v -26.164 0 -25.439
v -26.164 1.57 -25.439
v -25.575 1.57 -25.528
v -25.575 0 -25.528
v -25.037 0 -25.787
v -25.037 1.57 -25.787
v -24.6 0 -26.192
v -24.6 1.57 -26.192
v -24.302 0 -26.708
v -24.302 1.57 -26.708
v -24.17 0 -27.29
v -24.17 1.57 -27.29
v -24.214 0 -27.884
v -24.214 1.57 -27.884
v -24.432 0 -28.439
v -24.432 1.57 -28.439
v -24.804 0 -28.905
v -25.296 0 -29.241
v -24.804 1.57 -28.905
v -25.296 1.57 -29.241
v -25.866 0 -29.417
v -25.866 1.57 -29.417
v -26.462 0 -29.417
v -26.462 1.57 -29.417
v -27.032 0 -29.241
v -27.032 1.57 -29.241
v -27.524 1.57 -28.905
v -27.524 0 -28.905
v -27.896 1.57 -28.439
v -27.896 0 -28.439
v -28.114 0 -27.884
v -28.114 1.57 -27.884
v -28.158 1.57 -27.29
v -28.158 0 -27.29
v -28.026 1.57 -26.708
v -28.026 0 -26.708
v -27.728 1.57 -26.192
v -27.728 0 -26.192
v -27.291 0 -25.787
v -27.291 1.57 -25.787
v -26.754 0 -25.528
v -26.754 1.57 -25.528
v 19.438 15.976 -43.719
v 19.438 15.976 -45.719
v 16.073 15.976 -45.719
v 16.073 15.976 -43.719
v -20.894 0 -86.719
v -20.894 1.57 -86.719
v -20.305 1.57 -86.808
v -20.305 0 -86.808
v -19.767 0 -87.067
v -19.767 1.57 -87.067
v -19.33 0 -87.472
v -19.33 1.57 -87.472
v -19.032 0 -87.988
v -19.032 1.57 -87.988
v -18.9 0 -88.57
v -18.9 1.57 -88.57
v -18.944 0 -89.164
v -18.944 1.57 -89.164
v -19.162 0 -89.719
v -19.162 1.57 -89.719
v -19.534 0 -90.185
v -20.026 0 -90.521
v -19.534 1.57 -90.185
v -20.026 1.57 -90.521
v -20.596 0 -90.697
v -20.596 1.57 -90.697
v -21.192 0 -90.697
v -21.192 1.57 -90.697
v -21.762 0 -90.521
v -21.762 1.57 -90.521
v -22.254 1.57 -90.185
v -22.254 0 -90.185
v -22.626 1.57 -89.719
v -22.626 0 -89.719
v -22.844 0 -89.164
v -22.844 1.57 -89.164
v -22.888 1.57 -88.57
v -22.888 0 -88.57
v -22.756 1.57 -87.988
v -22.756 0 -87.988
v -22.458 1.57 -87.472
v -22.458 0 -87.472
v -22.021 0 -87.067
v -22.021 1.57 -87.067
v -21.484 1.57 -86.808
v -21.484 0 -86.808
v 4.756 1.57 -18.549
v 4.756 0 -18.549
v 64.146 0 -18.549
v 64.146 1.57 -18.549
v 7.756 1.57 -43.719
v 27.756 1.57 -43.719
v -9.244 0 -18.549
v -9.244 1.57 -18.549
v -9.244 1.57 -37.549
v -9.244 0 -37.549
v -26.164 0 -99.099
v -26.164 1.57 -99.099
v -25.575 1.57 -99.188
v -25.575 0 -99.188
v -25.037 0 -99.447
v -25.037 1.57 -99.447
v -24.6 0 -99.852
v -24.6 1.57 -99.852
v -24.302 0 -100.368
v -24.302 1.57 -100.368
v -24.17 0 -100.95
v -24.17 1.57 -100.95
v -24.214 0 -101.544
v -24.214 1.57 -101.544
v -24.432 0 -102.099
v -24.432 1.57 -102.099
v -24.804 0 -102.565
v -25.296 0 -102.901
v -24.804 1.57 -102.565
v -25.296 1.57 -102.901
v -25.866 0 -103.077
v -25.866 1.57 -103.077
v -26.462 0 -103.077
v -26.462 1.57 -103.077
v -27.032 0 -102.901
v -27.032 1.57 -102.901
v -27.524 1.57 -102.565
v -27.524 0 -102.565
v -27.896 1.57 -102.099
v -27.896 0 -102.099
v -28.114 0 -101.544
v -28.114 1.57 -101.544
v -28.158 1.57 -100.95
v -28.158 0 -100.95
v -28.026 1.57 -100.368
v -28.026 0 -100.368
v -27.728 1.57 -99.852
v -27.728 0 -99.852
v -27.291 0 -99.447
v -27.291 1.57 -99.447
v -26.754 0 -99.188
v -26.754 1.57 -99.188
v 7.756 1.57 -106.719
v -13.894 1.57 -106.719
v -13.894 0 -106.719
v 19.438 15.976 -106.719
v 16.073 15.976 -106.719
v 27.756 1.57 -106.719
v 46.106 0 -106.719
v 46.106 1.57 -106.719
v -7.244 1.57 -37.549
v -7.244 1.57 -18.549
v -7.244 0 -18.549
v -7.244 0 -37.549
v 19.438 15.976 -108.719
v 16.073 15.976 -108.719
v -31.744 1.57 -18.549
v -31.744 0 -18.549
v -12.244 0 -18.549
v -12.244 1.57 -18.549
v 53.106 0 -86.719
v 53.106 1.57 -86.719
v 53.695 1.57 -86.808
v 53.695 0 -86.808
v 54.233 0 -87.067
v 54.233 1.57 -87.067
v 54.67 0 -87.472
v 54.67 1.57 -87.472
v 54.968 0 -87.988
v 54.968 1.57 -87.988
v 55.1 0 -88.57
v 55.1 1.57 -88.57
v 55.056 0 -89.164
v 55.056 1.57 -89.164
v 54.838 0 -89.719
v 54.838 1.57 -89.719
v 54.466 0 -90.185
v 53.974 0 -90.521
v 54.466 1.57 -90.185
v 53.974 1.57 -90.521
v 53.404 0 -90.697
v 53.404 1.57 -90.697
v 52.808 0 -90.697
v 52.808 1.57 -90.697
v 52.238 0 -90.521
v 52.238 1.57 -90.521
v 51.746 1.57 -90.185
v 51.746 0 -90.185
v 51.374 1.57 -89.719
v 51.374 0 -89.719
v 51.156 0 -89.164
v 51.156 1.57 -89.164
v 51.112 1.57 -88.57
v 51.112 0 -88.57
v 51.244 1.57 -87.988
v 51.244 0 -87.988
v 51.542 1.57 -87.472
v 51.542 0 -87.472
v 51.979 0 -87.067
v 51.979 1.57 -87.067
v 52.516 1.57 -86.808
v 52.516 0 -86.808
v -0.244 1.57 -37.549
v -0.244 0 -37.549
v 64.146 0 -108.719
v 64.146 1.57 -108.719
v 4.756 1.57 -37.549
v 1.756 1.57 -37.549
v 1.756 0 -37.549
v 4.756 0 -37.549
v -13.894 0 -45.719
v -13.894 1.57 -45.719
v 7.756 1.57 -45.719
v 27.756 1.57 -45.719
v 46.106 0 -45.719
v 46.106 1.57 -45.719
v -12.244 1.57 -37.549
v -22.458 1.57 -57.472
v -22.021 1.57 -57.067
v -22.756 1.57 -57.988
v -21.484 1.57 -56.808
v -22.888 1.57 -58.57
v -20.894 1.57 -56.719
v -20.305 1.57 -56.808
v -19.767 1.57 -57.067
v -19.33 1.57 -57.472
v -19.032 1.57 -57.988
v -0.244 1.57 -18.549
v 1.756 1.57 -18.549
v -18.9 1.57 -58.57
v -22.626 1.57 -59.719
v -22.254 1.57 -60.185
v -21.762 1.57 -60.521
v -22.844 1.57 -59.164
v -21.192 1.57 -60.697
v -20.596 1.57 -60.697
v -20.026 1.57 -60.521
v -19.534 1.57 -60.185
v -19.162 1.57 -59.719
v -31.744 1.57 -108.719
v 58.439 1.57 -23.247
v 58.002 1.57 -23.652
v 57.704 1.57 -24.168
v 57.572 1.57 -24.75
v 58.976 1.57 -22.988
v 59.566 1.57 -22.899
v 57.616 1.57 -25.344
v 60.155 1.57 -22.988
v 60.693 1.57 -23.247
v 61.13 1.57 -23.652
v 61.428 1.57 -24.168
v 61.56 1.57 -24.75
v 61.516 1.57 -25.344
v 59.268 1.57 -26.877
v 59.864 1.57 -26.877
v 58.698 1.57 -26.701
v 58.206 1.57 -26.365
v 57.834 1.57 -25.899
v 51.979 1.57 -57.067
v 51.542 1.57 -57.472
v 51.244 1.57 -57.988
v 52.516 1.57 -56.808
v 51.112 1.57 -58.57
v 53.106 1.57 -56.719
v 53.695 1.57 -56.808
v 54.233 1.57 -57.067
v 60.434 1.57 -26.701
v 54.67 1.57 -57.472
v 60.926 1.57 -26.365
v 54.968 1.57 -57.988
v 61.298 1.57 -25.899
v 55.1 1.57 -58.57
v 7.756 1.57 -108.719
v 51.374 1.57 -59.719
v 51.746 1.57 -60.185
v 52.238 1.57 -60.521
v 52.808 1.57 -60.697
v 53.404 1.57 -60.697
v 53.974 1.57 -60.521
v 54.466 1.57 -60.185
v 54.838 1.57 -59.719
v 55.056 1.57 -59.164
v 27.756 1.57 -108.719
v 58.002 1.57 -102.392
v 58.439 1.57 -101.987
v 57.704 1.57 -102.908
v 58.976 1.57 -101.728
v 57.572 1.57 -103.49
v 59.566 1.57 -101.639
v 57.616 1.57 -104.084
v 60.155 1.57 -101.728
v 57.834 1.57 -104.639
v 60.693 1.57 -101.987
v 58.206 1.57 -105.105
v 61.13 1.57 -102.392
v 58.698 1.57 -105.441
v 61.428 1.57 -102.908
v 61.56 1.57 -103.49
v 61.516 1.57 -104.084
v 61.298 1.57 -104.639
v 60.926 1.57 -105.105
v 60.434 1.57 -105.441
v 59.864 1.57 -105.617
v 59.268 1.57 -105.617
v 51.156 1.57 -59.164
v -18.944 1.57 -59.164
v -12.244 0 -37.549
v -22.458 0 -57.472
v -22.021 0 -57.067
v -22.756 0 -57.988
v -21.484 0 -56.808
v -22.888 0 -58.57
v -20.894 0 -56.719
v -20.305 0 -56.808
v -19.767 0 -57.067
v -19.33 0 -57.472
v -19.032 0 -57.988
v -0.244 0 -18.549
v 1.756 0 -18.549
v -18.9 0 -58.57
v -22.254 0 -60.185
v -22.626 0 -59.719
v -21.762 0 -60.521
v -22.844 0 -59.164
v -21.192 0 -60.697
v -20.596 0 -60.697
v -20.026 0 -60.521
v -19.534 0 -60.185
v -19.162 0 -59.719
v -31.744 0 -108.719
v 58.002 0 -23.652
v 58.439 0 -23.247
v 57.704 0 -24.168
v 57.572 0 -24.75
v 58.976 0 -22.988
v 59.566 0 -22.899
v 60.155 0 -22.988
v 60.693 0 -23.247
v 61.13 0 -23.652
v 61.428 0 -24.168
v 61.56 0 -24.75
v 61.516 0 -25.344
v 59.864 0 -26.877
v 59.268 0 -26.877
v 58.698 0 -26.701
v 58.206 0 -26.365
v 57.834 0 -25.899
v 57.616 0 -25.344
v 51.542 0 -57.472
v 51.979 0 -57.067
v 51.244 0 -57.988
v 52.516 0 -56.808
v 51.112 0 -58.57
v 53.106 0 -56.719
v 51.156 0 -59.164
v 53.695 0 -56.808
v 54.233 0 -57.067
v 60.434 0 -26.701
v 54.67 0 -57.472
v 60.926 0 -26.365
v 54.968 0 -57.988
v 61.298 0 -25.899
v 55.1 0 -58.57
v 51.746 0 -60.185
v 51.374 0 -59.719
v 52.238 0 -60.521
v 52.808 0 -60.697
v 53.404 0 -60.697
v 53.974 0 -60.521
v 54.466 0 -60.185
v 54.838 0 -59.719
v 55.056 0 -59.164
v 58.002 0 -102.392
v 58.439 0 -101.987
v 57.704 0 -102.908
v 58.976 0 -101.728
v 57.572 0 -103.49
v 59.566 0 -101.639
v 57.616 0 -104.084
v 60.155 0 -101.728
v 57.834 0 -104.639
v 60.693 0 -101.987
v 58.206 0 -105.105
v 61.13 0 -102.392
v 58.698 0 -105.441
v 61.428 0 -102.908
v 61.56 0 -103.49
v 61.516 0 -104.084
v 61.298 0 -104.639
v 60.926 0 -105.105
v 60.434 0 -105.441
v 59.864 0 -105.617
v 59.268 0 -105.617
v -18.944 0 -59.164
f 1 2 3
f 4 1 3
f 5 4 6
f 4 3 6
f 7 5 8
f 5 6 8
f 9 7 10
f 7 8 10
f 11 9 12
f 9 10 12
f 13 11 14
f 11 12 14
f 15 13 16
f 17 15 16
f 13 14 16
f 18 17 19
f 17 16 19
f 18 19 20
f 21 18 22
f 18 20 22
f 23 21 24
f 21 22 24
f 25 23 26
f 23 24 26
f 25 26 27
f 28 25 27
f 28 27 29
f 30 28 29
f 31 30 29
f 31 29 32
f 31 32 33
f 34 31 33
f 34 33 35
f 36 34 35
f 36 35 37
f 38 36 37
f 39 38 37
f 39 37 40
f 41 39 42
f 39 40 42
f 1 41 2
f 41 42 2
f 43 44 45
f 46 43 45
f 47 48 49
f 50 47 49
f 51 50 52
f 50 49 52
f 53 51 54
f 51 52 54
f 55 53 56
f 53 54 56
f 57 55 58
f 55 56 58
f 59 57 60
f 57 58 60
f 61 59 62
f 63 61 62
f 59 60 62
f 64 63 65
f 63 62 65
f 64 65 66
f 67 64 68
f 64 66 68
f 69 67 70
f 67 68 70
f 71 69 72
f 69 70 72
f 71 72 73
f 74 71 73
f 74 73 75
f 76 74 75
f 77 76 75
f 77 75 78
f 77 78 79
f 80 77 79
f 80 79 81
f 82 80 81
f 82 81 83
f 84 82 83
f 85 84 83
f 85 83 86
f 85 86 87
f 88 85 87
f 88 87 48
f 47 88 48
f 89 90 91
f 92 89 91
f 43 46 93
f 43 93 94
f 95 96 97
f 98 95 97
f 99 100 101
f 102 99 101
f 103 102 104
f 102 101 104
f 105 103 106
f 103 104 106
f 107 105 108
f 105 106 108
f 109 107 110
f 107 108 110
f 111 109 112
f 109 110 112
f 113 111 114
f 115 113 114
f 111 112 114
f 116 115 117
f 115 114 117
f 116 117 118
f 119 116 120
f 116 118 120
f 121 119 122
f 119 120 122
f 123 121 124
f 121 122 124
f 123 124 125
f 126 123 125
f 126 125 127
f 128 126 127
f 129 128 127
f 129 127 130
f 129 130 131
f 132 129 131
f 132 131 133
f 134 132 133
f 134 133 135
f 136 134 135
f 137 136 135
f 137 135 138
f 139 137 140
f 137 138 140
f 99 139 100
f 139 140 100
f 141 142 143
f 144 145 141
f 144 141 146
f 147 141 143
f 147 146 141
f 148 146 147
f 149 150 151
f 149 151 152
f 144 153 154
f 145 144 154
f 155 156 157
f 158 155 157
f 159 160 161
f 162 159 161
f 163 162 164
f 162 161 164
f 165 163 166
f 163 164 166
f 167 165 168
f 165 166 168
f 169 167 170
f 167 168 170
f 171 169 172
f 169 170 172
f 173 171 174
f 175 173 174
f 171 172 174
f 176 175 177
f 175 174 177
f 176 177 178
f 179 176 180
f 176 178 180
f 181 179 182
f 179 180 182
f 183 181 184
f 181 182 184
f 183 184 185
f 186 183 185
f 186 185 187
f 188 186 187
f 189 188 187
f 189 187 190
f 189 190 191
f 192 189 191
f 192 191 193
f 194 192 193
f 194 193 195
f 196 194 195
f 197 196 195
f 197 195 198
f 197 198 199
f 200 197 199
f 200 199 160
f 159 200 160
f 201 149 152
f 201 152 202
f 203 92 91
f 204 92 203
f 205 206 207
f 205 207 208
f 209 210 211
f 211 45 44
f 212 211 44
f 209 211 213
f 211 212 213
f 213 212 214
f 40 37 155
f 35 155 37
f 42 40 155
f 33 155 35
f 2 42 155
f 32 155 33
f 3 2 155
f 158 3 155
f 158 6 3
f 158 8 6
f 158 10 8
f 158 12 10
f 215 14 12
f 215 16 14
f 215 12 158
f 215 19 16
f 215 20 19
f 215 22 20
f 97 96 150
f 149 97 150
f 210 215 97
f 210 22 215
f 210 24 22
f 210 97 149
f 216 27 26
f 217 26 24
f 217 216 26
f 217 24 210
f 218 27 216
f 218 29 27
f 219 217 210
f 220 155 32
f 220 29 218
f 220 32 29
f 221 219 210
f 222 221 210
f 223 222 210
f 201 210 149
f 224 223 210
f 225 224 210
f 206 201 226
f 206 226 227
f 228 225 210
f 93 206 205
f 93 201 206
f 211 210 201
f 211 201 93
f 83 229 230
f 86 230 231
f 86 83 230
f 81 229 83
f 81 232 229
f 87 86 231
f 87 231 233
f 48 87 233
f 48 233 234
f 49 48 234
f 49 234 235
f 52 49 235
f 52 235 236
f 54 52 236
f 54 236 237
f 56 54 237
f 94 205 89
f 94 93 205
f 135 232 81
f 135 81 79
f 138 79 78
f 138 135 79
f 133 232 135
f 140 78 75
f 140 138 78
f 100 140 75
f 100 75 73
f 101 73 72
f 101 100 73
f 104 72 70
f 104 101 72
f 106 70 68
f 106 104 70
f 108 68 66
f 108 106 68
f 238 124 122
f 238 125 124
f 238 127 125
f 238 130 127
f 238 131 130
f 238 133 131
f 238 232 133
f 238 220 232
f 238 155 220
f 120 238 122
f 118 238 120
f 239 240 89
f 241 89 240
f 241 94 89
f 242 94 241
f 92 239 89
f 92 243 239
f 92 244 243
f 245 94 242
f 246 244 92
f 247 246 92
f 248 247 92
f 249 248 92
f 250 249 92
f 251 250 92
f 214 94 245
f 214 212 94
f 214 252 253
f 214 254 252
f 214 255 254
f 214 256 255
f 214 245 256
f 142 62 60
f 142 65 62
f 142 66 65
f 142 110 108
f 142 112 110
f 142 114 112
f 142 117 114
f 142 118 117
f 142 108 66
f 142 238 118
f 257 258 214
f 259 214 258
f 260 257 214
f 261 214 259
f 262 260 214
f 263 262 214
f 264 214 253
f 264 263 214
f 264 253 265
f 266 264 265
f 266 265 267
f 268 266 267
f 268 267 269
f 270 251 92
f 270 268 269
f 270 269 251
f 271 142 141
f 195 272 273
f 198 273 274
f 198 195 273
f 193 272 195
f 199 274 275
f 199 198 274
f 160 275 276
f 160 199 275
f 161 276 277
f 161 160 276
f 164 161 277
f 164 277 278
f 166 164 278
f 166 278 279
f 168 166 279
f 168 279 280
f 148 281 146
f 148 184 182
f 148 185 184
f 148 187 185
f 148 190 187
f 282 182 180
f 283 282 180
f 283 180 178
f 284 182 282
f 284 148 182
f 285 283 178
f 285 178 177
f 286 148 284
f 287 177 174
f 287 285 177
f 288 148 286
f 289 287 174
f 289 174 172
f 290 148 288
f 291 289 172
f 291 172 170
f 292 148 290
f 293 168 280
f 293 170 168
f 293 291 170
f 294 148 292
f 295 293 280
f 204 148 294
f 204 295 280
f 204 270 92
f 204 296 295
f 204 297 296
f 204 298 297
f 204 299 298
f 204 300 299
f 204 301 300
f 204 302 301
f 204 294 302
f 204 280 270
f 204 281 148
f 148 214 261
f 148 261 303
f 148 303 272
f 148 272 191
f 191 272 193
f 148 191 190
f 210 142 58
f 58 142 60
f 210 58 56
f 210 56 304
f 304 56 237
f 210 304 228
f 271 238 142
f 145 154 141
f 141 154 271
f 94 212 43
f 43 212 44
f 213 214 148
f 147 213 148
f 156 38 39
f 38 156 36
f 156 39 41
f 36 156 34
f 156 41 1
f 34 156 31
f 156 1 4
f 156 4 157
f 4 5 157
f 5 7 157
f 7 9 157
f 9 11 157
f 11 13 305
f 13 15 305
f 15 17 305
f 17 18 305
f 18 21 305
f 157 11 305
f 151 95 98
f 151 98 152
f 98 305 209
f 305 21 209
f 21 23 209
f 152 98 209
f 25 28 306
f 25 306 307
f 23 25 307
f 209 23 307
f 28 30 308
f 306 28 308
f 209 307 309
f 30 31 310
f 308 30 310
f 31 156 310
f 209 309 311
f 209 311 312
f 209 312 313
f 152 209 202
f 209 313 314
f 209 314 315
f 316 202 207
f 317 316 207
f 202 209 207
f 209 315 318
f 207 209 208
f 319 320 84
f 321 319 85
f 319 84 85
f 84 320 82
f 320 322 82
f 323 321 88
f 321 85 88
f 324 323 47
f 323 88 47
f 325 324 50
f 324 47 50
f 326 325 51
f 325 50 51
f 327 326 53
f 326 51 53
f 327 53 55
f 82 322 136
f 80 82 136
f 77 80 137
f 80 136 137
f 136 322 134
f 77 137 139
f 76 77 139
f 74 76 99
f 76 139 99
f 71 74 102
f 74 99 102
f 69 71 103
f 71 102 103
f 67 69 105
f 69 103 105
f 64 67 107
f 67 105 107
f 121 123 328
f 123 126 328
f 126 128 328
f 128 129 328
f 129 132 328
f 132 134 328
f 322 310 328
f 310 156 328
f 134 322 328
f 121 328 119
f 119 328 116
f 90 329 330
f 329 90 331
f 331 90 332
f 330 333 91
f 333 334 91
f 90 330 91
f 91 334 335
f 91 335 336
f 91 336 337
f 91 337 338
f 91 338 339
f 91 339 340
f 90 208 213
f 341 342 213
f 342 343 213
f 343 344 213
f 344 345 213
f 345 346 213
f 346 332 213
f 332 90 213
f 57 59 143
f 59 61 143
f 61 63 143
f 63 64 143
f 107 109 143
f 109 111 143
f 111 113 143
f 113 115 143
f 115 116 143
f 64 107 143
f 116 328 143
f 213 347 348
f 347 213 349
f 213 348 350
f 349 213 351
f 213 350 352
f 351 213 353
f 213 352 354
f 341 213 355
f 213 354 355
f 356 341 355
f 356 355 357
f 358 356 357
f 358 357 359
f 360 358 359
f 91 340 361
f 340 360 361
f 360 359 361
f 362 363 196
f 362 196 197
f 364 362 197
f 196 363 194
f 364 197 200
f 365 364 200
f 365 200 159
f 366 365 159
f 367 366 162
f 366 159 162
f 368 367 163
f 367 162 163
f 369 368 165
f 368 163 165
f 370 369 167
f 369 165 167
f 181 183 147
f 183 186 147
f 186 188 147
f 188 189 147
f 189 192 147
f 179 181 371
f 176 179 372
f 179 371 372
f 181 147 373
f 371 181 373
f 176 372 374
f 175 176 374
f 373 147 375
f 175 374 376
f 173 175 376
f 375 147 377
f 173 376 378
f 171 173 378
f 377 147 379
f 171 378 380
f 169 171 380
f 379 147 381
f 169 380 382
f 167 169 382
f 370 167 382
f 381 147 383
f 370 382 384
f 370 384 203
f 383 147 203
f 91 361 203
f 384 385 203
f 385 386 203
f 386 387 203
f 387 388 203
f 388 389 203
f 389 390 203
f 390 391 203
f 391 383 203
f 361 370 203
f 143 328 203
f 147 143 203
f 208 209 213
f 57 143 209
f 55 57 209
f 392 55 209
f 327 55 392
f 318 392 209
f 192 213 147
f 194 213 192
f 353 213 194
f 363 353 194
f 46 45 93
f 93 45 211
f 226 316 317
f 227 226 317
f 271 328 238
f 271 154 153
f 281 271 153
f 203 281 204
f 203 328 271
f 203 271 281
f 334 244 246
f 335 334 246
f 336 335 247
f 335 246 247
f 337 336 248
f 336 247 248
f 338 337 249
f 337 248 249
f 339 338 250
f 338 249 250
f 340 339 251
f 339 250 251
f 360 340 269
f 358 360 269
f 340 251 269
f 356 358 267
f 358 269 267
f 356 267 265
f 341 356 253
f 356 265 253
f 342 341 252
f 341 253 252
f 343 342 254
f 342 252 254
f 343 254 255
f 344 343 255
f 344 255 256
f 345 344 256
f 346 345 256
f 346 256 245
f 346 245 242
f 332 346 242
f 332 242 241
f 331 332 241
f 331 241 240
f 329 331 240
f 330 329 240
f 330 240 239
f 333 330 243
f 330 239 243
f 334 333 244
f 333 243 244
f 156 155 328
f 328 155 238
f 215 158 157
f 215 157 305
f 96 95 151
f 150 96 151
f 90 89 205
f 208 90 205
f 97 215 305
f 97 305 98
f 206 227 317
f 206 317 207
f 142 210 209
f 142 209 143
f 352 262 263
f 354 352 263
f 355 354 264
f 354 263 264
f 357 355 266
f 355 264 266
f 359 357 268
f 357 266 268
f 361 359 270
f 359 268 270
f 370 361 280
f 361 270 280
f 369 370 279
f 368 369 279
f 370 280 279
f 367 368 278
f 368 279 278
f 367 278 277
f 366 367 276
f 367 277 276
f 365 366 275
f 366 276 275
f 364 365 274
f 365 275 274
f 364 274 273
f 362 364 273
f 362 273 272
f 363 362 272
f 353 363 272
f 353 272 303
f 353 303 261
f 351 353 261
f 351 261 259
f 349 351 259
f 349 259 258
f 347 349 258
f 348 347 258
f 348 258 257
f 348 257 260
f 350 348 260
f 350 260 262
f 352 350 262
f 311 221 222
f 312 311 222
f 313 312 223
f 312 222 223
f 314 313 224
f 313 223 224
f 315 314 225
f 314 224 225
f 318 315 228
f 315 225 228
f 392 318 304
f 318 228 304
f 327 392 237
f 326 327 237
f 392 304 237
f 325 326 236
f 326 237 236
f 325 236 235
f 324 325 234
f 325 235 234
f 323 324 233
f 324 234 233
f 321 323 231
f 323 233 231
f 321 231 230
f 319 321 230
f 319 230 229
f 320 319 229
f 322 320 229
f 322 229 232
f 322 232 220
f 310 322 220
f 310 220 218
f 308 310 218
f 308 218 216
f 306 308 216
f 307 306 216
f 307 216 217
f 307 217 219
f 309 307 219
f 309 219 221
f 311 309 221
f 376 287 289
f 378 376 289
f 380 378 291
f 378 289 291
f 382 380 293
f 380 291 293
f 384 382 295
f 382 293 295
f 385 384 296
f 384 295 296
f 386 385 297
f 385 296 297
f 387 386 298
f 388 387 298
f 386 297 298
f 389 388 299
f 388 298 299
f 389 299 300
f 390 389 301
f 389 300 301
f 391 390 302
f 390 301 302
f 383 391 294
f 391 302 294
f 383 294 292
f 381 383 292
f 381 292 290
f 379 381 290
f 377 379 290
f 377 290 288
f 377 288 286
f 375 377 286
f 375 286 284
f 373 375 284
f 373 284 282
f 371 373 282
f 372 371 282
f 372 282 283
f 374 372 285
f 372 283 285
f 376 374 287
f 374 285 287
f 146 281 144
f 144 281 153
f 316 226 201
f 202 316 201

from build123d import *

# Parameters (mm, degrees)
SKETCH1_W               = 96.89
SKETCH1_H               = 90.17
PCB_DEPTH               = 1.57
SKETCH2_R               = 2
M3_MOUNTING_HOLES_DEPTH = 1.57
SKETCH4_R               = 2
CUT_EXTRUDE1_DEPTH      = 23
BOSS_EXTRUDE2_DEPTH     = 2
BOSS_EXTRUDE3_DEPTH     = 2
SKETCH9_W               = 3
SKETCH9_H               = 19
SKETCH9_W_2             = 7
CUT_EXTRUDE2_DEPTH      = 128.304608561
SKETCH10_W              = 0.5
SKETCH10_H              = 90.17
CUT_EXTRUDE3_DEPTH      = 10
SKETCH11_W              = 60
SKETCH11_H              = 61
CUT_EXTRUDE4_DEPTH      = 10


with BuildPart() as part:
    # Sketch1 → PCB (new body)
    with BuildSketch(Plane(origin=(0, 0, 0), x_dir=(1, 0, 0), z_dir=(0, 1, 0))):
        with Locations((16.200949951, 63.633996534)):
            Rectangle(SKETCH1_W, SKETCH1_H)
    extrude(amount=PCB_DEPTH)

    # Sketch2 → M3 Mounting Holes (cut)
    with BuildSketch(Plane(origin=(0, 1.57, 0), x_dir=(1, 0, 0), z_dir=(0, 1, 0))):
        with Locations(Location((59.565949951, 24.898996534, 0), (0, 0, 270))):
            Circle(SKETCH2_R)
        with Locations(Location((-26.164050049, 27.438996534, 0), (0, 0, 270))):
            Circle(SKETCH2_R)
        with Locations(Location((-26.164050049, 101.098996534, 0), (0, 0, 270))):
            Circle(SKETCH2_R)
        with Locations(Location((59.565949951, 103.638996534, 0), (0, 0, 270))):
            Circle(SKETCH2_R)
    extrude(amount=-M3_MOUNTING_HOLES_DEPTH, mode=Mode.SUBTRACT)

    # Sketch4 → Cut-Extrude1 (cut)
    with BuildSketch(Plane(origin=(0, 1.57, 0), x_dir=(1, 0, 0), z_dir=(0, 1, 0))):
        with Locations(Location((-20.894050049, 88.718996534, 0), (0, 0, 270))):
            Circle(SKETCH4_R)
        with Locations(Location((53.105949951, 88.718996534, 0), (0, 0, 270))):
            Circle(SKETCH4_R)
        with Locations(Location((-20.894050049, 58.718996534, 0), (0, 0, 270))):
            Circle(SKETCH4_R)
        with Locations(Location((53.105949951, 58.718996534, 0), (0, 0, 270))):
            Circle(SKETCH4_R)
    extrude(amount=-CUT_EXTRUDE1_DEPTH, mode=Mode.SUBTRACT)

    # Sketch7 → Boss-Extrude2 (add)
    with BuildSketch(Plane.XY.offset(-45.718996534)):
        Polygon((27.755949951, 1.57), (19.438412086, 15.976398176), (16.073487816, 15.976398176), (7.755949951, 1.57), align=None)
    extrude(amount=BOSS_EXTRUDE2_DEPTH)

    # Sketch8 → Boss-Extrude3 (add)
    with BuildSketch(Plane.XY.offset(-108.718996534)):
        Polygon((27.755949951, 1.57), (19.438412086, 15.976398176), (16.073487816, 15.976398176), (7.755949951, 1.57), align=None)
    extrude(amount=BOSS_EXTRUDE3_DEPTH)

    # Sketch9 → Cut-Extrude2 (cut, through all)
    with BuildSketch(Plane(origin=(0, 1.57, 0), x_dir=(1, 0, 0), z_dir=(0, 1, 0))):
        with Locations((-10.744050049, 28.048996534)):
            Rectangle(SKETCH9_W, SKETCH9_H)
        with Locations((-3.744050049, 28.048996534)):
            Rectangle(SKETCH9_W_2, SKETCH9_H)
        with Locations((3.255949951, 28.048996534)):
            Rectangle(SKETCH9_W, SKETCH9_H)
    extrude(amount=-CUT_EXTRUDE2_DEPTH, mode=Mode.SUBTRACT)

    # Sketch10 → Cut-Extrude3 (cut)
    with BuildSketch(Plane(origin=(0, 1.57, 0), x_dir=(1, 0, 0), z_dir=(0, 1, 0))):
        with Locations((-31.994050049, 63.633996534)):
            Rectangle(SKETCH10_W, SKETCH10_H)
        with Locations((64.395949951, 63.633996534)):
            Rectangle(SKETCH10_W, SKETCH10_H)
    extrude(amount=-CUT_EXTRUDE3_DEPTH, mode=Mode.SUBTRACT)

    # Sketch11 → Cut-Extrude4 (cut)
    with BuildSketch(Plane(origin=(0, 1.57, 0), x_dir=(1, 0, 0), z_dir=(0, 1, 0))):
        with Locations((16.105949951, 76.218996534)):
            Rectangle(SKETCH11_W, SKETCH11_H)
    extrude(amount=-CUT_EXTRUDE4_DEPTH, mode=Mode.SUBTRACT)


solid = part.part
